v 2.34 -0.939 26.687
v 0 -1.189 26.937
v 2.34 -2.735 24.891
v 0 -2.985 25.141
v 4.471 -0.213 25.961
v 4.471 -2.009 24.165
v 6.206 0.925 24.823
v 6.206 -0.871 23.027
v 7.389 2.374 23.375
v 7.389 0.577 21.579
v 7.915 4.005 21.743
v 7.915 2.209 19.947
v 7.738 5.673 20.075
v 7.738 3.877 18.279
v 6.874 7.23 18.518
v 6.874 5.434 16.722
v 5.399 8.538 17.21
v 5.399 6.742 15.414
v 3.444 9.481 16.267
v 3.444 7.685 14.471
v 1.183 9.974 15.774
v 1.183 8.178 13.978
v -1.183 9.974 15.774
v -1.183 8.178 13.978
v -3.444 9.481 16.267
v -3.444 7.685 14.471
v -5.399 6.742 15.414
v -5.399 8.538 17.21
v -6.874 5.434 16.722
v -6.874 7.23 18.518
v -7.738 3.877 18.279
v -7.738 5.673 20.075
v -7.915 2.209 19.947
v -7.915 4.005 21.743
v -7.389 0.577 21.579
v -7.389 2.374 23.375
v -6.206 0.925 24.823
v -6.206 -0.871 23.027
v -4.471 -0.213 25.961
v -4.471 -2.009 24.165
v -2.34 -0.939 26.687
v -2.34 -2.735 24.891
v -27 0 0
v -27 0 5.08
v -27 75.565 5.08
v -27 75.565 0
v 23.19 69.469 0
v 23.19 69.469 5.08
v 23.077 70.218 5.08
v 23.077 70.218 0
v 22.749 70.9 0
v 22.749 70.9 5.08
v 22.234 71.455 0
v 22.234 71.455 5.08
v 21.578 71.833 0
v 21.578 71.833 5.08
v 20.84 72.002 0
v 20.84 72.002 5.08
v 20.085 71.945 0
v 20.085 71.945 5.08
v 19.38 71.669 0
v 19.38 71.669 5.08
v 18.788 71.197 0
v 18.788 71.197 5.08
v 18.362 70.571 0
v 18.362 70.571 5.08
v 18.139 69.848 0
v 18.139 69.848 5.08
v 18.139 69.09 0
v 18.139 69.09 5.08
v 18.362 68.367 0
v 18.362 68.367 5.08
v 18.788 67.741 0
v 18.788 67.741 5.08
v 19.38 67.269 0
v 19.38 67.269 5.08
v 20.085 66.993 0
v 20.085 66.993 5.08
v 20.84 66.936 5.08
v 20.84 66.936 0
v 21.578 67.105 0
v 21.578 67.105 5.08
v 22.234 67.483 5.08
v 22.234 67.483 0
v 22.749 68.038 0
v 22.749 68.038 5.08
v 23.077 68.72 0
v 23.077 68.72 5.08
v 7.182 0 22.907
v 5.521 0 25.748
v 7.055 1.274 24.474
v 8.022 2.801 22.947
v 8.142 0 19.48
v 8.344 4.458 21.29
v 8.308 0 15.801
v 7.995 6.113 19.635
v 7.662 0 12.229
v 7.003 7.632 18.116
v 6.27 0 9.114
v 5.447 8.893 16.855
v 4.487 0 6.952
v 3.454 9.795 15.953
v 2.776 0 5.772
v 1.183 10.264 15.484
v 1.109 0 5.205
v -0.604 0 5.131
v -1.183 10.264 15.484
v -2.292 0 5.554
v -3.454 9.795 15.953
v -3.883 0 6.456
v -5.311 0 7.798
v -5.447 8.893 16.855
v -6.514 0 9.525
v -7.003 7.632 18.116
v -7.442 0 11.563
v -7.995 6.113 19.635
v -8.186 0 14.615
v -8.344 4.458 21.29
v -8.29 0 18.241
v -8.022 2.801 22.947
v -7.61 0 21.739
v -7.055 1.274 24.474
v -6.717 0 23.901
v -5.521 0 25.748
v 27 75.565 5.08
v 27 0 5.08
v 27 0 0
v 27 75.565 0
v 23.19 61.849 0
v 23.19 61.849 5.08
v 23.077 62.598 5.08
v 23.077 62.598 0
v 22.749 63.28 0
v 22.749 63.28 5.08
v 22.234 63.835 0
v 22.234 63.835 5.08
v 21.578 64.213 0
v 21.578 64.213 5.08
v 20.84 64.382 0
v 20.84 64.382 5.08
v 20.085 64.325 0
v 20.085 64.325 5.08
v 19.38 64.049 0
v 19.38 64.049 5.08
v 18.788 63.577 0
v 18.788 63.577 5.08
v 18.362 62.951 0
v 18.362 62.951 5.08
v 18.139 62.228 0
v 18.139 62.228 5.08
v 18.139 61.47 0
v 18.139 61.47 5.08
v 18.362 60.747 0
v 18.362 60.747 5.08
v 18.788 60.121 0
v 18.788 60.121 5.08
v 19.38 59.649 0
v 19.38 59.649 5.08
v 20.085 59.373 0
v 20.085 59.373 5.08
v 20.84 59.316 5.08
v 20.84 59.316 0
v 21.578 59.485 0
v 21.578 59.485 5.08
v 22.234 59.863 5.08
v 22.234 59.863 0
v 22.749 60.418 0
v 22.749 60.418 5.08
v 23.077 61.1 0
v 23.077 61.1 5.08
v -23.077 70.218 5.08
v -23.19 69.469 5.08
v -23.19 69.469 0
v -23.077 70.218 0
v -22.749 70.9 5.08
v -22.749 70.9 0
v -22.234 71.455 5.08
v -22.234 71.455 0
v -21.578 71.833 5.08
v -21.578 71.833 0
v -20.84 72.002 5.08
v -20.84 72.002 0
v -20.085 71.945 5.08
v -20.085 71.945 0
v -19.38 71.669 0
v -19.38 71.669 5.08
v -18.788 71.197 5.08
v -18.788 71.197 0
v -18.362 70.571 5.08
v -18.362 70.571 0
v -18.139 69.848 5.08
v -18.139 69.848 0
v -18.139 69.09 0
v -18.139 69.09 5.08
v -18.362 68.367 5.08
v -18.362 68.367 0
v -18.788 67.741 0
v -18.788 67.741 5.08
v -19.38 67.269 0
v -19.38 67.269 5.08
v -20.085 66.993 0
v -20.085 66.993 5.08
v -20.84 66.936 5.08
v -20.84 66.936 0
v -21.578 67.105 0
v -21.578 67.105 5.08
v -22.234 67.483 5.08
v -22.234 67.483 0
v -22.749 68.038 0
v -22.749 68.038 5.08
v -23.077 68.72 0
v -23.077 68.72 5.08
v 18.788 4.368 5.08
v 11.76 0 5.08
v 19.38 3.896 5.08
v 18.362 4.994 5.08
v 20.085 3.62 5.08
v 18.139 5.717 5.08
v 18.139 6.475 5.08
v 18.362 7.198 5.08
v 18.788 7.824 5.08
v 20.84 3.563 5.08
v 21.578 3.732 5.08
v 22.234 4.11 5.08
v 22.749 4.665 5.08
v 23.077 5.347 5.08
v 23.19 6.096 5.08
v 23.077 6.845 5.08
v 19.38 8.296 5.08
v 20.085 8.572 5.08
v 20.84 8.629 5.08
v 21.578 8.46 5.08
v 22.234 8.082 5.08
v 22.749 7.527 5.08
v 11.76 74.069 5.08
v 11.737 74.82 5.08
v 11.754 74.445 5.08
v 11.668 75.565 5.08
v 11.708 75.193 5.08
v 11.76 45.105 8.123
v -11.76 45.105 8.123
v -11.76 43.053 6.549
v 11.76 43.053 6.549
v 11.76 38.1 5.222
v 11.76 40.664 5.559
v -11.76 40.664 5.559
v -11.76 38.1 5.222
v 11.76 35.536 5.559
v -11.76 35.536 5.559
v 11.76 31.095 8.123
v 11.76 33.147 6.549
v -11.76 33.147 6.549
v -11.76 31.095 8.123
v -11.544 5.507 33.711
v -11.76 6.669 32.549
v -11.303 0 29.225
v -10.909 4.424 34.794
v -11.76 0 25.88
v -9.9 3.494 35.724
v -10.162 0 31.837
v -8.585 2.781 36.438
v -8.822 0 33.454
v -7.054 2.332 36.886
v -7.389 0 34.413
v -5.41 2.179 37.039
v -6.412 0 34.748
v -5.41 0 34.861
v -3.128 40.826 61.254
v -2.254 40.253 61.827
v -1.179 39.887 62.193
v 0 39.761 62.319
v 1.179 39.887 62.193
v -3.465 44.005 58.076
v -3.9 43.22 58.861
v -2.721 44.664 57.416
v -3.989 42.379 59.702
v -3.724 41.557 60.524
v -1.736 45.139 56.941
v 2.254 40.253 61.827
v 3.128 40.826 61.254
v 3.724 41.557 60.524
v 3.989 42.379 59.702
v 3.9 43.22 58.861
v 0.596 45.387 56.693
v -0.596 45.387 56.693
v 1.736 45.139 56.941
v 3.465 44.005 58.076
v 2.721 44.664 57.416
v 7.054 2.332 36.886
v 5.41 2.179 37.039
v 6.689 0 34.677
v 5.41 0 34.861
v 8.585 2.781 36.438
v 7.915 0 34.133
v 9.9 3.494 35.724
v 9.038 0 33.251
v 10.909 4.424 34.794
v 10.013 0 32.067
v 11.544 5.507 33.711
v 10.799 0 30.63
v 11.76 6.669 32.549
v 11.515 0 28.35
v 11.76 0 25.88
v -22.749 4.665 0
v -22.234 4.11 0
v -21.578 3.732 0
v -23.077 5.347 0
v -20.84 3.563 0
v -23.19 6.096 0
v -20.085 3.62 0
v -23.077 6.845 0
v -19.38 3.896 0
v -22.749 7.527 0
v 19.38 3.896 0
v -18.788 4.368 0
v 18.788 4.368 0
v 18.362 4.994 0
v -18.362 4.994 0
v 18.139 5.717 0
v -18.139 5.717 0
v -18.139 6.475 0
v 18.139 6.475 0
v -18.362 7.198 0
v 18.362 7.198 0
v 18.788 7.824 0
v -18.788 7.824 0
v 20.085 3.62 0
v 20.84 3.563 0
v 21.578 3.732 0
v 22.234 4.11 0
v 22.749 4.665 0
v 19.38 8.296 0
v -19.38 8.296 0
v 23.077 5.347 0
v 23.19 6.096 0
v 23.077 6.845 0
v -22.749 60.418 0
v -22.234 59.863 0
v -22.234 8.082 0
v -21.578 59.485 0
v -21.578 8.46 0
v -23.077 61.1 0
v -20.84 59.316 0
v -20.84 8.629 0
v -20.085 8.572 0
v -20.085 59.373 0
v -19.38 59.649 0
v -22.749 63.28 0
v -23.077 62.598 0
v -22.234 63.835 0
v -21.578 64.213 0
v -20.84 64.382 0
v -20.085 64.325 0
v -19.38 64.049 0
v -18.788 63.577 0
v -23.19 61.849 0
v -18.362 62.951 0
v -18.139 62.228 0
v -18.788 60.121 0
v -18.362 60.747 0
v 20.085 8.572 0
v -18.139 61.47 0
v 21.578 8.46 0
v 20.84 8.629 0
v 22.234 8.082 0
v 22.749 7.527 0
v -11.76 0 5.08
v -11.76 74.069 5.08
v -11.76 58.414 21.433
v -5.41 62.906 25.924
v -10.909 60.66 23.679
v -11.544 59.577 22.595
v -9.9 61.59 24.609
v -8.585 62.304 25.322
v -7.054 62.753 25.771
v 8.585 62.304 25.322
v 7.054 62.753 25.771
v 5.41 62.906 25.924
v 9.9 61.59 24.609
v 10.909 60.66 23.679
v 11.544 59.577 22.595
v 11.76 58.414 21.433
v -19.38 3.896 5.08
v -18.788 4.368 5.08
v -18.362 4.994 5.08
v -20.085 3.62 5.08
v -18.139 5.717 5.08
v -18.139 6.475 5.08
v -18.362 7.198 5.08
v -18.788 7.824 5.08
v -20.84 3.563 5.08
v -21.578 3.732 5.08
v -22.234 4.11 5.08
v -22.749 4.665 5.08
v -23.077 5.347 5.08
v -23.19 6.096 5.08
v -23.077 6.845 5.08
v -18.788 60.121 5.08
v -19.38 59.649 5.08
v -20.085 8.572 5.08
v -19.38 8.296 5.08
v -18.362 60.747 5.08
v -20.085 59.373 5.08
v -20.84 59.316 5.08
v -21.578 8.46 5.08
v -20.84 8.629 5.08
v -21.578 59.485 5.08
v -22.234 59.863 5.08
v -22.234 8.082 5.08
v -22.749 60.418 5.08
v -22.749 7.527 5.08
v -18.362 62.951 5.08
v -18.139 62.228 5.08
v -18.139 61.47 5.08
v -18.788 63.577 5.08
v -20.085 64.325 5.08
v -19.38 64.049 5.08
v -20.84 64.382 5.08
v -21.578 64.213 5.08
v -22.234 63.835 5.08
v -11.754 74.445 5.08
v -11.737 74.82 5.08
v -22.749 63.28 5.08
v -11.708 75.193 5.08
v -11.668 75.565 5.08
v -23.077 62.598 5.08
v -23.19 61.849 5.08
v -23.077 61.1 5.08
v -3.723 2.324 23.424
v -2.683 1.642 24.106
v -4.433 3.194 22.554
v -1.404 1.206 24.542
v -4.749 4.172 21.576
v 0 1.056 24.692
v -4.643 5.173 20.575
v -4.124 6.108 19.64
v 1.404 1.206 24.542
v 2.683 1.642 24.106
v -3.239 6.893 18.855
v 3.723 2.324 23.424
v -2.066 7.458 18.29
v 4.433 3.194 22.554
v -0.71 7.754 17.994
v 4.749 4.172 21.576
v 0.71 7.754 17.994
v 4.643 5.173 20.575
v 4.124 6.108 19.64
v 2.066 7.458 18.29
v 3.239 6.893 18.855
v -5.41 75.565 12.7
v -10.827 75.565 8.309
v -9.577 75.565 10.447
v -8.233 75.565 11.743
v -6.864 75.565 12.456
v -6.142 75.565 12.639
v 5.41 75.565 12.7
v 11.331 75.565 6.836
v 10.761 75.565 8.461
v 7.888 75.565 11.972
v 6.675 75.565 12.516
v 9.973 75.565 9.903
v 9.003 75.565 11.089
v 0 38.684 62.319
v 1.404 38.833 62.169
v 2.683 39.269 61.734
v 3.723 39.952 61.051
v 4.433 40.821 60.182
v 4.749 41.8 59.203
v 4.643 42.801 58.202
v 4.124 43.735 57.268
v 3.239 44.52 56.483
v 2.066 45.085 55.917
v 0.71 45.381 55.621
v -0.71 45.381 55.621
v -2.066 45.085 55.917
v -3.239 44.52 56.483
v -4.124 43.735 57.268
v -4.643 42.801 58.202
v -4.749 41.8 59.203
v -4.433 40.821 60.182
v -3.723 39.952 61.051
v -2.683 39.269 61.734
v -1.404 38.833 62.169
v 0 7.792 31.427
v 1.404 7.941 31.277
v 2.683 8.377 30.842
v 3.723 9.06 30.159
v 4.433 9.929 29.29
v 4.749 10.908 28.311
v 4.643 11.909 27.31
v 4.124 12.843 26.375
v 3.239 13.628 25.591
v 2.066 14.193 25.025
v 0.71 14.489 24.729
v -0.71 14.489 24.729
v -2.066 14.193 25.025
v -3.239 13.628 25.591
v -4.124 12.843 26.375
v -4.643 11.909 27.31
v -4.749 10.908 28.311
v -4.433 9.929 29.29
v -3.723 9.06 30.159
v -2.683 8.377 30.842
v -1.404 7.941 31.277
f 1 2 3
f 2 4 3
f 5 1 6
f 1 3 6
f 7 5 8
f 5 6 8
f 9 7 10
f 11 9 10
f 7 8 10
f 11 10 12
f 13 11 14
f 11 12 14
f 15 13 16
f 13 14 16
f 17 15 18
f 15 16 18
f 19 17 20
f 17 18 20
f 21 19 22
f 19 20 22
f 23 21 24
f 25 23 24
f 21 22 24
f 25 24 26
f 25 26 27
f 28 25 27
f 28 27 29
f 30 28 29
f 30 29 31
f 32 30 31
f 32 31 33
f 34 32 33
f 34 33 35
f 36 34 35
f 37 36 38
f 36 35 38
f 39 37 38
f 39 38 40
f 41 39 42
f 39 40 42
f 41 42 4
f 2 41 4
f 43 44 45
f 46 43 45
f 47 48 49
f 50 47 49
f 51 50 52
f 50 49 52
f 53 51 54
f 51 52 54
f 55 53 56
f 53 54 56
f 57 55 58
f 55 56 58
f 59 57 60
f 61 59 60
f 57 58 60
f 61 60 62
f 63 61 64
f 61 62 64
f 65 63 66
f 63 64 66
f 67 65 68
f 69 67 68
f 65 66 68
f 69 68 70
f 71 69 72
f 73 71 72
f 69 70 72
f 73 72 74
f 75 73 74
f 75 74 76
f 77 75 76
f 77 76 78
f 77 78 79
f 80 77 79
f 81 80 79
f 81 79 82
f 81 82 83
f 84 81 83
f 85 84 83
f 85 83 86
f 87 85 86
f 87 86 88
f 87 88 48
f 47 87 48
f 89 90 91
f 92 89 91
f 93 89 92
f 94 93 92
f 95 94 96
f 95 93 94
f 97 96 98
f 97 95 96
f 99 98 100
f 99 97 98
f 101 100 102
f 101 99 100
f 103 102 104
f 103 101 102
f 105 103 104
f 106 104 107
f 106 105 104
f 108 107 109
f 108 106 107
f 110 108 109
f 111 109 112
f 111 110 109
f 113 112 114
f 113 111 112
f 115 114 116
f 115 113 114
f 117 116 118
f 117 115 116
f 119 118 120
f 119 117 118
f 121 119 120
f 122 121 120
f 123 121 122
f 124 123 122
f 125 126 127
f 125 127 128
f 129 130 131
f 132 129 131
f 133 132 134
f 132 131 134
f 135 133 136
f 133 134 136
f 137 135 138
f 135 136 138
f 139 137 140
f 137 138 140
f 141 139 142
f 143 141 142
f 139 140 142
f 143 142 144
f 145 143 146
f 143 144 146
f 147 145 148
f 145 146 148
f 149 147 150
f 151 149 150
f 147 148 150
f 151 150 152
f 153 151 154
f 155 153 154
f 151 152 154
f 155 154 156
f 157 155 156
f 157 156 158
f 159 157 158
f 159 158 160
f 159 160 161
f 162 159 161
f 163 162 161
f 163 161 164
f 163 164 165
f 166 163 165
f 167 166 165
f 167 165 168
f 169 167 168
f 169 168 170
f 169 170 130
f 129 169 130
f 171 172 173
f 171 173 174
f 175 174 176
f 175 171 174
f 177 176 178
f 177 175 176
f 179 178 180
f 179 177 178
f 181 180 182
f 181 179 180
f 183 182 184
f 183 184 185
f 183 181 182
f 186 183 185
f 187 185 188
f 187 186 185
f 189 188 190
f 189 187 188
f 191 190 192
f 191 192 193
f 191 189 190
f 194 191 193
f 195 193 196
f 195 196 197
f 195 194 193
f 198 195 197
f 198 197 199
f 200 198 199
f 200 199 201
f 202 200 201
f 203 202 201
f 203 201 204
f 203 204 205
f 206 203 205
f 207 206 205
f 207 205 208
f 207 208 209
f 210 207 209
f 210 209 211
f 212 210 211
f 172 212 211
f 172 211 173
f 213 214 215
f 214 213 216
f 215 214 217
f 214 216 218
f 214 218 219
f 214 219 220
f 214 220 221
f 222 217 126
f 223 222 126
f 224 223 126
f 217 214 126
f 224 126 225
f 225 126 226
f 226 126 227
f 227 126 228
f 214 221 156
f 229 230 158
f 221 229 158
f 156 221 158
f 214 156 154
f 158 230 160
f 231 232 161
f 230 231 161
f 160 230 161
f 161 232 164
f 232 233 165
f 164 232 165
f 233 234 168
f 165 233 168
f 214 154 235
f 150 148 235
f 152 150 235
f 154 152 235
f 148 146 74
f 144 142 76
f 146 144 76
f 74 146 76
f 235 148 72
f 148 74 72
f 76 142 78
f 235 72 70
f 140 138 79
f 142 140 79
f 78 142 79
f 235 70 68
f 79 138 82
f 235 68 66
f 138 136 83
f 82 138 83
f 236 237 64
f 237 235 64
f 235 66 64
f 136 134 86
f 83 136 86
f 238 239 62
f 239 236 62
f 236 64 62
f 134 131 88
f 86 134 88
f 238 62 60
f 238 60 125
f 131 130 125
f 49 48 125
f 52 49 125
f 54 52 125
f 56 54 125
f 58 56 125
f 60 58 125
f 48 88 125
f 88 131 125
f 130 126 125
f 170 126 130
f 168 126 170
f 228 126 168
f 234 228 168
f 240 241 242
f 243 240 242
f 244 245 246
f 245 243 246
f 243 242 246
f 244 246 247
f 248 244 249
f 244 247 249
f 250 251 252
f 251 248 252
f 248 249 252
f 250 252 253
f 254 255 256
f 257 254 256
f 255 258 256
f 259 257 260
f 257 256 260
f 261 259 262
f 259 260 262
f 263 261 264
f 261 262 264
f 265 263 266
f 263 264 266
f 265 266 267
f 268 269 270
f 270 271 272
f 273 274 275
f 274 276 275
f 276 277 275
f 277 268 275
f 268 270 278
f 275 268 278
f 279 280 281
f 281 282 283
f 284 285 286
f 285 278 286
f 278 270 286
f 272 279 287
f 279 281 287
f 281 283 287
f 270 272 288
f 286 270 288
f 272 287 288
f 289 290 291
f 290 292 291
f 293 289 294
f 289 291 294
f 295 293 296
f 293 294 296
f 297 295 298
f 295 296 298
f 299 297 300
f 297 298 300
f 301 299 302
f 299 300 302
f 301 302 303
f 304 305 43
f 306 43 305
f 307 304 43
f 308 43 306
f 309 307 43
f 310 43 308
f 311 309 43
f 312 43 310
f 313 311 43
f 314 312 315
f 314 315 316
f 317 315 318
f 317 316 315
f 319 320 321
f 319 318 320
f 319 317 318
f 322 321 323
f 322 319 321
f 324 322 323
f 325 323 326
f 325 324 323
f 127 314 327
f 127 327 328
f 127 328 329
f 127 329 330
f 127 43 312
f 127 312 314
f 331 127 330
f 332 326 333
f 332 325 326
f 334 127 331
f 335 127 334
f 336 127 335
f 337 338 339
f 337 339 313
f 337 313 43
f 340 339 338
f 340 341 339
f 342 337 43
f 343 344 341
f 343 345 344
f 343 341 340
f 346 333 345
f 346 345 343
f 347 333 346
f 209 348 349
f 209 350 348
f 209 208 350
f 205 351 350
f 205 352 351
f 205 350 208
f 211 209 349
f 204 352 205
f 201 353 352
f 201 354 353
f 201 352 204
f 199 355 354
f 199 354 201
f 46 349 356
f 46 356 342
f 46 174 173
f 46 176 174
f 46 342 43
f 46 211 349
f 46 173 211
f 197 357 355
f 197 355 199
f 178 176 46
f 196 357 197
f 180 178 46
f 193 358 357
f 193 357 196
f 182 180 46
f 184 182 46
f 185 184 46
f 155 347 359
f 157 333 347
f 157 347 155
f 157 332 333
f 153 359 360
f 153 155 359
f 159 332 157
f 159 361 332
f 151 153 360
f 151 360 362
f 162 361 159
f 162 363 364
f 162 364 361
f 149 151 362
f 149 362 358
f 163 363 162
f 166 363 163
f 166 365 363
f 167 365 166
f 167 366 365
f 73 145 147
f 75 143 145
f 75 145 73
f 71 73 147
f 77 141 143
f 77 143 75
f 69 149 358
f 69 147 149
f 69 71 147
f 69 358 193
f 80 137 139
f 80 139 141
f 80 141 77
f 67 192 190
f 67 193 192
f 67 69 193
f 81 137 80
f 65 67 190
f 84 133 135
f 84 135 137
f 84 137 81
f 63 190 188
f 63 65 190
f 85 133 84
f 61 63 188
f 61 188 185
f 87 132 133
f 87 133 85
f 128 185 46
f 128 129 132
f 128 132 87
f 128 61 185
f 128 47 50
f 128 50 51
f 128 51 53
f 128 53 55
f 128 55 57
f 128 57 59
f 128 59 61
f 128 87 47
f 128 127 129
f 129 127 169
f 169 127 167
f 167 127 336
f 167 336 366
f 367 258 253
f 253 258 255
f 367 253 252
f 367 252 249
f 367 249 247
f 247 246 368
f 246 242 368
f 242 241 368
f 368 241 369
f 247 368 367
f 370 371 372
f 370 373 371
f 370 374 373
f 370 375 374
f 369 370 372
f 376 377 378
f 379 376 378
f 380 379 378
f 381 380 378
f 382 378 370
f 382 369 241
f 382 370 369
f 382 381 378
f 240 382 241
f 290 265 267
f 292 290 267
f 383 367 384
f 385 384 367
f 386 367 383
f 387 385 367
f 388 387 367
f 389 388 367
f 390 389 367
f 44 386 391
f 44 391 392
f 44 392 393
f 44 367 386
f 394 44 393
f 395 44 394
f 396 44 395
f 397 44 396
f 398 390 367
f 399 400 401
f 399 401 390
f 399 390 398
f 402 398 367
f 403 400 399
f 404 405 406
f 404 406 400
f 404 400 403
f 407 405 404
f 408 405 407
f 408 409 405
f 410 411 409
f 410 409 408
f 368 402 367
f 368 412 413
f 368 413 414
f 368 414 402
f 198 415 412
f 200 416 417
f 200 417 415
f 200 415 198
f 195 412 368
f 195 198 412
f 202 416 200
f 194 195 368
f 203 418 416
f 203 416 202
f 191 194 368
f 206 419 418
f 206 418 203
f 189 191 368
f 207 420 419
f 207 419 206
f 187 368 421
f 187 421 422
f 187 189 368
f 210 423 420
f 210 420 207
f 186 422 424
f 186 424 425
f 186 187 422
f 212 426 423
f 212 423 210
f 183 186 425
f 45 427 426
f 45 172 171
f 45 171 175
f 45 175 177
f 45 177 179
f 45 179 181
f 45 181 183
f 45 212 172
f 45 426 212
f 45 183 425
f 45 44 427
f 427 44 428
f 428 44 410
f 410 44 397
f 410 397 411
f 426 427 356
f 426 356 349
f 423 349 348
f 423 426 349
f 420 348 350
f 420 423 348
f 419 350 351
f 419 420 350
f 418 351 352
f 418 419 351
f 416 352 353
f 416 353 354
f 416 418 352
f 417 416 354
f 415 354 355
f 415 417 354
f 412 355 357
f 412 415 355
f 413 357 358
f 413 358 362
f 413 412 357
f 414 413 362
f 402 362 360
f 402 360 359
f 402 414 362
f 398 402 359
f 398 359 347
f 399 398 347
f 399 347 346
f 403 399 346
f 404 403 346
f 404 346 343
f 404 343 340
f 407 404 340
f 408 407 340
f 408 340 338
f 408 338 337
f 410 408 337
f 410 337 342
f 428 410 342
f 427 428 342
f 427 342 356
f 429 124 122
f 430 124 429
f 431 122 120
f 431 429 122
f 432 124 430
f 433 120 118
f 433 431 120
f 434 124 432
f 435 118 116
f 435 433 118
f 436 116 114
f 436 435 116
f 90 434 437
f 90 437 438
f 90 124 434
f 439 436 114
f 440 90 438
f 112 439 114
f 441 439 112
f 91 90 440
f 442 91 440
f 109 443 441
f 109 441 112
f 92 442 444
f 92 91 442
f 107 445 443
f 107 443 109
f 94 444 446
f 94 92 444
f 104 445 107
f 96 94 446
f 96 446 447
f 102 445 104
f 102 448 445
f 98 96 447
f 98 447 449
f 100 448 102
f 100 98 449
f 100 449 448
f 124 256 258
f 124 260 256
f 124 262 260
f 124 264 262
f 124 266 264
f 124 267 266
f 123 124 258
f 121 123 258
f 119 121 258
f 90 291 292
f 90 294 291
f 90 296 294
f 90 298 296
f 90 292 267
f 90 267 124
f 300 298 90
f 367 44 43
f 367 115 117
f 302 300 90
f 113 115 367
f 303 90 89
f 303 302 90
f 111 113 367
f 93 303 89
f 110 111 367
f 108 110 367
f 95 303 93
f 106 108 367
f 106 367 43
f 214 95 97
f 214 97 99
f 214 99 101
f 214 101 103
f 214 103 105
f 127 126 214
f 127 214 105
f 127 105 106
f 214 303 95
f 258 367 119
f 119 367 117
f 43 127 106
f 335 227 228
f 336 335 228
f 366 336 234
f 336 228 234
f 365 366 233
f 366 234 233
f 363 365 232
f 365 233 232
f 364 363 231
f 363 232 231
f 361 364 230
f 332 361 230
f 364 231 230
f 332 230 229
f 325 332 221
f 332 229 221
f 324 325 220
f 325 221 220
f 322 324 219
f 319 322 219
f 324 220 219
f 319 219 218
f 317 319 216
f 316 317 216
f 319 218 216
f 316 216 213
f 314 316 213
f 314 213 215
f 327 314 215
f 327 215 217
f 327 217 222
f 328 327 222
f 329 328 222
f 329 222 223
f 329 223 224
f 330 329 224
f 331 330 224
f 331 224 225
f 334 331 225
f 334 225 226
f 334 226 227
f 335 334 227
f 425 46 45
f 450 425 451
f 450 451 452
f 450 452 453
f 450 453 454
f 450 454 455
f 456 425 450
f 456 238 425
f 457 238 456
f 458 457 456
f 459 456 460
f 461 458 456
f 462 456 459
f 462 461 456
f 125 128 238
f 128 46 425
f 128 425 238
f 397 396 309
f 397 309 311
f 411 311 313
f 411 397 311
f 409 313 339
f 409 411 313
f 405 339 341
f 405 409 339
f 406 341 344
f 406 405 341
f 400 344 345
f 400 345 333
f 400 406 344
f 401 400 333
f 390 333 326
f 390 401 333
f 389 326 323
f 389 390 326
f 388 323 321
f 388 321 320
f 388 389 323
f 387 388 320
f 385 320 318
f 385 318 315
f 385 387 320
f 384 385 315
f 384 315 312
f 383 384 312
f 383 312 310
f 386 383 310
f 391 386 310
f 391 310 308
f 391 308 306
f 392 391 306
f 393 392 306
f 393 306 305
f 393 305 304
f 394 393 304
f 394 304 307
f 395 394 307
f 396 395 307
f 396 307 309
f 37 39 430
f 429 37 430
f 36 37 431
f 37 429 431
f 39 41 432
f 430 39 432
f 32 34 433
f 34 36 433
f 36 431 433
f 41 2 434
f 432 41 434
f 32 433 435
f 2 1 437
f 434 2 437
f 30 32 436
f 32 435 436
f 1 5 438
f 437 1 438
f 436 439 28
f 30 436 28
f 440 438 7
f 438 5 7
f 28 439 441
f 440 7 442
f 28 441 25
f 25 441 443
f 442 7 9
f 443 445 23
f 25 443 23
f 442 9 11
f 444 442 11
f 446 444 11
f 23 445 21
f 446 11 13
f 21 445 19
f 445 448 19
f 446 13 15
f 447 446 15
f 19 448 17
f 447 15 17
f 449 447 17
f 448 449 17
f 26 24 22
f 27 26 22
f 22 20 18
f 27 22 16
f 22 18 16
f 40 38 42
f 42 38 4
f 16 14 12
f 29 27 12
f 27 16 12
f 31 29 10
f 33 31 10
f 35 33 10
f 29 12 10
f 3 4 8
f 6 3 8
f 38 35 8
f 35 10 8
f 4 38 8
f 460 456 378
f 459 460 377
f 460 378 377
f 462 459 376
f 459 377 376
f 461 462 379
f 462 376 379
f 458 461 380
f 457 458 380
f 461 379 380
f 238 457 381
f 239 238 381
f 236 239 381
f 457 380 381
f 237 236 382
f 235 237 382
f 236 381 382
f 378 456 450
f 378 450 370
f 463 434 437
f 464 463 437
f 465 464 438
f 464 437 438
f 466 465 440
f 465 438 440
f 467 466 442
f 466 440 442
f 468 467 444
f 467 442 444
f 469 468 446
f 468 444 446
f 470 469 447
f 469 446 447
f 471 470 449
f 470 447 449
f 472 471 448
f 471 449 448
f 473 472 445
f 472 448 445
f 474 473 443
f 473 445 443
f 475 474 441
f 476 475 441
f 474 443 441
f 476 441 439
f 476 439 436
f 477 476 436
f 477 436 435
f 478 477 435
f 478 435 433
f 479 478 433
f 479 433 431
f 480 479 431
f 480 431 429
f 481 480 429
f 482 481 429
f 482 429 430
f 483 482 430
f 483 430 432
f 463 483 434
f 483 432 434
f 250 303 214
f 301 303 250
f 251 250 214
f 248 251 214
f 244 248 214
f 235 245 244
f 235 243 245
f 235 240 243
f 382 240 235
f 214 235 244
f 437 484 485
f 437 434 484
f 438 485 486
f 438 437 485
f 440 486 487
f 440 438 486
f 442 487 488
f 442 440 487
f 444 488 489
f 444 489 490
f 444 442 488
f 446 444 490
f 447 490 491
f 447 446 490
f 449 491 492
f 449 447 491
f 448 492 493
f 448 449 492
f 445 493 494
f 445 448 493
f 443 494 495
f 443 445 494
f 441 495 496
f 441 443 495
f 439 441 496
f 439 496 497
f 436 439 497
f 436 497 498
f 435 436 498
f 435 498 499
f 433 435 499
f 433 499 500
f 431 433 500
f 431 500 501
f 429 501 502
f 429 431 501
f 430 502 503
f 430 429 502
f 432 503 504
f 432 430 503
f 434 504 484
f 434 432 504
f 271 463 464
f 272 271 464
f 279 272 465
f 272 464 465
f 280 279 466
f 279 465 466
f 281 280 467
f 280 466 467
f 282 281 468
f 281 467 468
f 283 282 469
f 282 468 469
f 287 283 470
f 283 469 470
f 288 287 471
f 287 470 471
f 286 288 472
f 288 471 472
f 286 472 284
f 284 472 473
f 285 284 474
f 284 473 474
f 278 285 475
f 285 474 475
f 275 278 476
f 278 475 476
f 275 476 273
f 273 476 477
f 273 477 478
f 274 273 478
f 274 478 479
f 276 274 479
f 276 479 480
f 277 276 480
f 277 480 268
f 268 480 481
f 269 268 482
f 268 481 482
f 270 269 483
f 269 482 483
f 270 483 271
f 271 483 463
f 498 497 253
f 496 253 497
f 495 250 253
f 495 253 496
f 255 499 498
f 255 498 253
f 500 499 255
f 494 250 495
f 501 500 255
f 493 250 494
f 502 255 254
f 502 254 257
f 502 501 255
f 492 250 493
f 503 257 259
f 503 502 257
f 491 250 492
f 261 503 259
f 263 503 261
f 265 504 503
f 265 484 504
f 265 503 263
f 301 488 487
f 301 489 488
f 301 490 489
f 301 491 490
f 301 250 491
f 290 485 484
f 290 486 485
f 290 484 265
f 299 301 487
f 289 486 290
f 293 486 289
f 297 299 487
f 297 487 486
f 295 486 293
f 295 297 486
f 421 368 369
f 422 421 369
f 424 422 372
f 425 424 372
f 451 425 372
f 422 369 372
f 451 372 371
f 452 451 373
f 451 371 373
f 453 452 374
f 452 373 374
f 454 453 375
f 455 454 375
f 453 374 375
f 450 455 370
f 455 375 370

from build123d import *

# Parameters (mm, degrees)
F1_DEPTH = 27.0002
F2_R     = 9.906
F3_W     = 75.7111017068
F3_H     = 31.9594877579
F4_DEPTH = 15.24
F5_R     = 2.54
F6_DEPTH = 5.081
F8_R     = 6.35
F13_SIZE = 0.762


with BuildPart() as f1:
    # F0 (on Right) → F1 (new body)
    with BuildSketch(Plane.YZ):
        Polygon((0, 34.8605122421), (0, 0), (75.565, 0), (75.565, 12.7), (62.9056579521, 25.9241212257), (38.1, 1.1184632736), (2.1789755157, 37.0394877579), align=None)
    extrude(amount=F1_DEPTH)

    # F2
    f2_edges = [f1.edges().sort_by_distance(p)[0] for p in [
        (13.5001, 38.1, 1.118463),
    ]]
    fillet(f2_edges, radius=F2_R)

    # F3 (on face) → F4 (cut)
    with BuildSketch(Plane.YZ.offset(27.0002)):
        with Locations((37.8555508534, 21.0597438789)):
            Rectangle(F3_W, F3_H)
    extrude(amount=-F4_DEPTH, mode=Mode.SUBTRACT)

    # F5 (on face) → F6 (cut, through all)
    with BuildSketch(Plane.XY.offset(5.08)):
        with Locations((20.6502, 69.469)):
            Circle(F5_R)
        with Locations((20.6502, 61.849)):
            Circle(F5_R)
        with Locations((20.6502, 6.096)):
            Circle(F5_R)
    extrude(amount=-F6_DEPTH, mode=Mode.SUBTRACT)

    # F7: F1 across face


with BuildPart() as f1_1:
    add(f1.part)
    add(f1.part.mirror(Plane.YZ))

    # F8
    f8_edges = [f1_1.edges().sort_by_distance(p)[0] for p in [
        (-11.7602, 69.235329, 19.312061),
        (11.7602, 69.235329, 19.312061),
        (-11.7602, 1.089488, 35.95),
        (11.7602, 1.089488, 35.95),
    ]]
    fillet(f8_edges, radius=F8_R)

    # F9 (on Right) → F10 (revolve, cut)
    with BuildSketch(Plane.YZ):
        Polygon((-8.45, 8.45), (11.1592316368, 28.0592316368), (7.7916355914, 31.4268276822), (1.0564435006, 24.6916355914), (-1.4759887256, 27.2240678175), (-14.3500282715, 14.3500282715), align=None)
    revolve(axis=Axis((0, 17.8944237276, 34.7944237276), (0, 0.7071067812, 0.7071067812)), mode=Mode.SUBTRACT)


with BuildPart() as f12:
    # F11 (on Right) → F12 (revolve)
    with BuildSketch(Plane.YZ):
        Polygon((7.7916355914, 31.4268276822), (1.0564435006, 24.6916355914), (-1.1886205297, 26.9366996217), (-2.9846717539, 25.1406483974), (2.6279883218, 19.5279883218), (42.5901280605, 59.4901280605), (39.2225320151, 62.8577241059), align=None)
    revolve(axis=Axis((0, 22.6090581912, 39.5090581912), (0, 0.7071067812, 0.7071067812)))

    # F13
    f13_edges = [f12.edges().sort_by_distance(p)[0] for p in [
        (0, 45.957724, 56.122532),
    ]]
    chamfer(f13_edges, length=F13_SIZE)


solid = Compound([f1_1.part, f12.part])
